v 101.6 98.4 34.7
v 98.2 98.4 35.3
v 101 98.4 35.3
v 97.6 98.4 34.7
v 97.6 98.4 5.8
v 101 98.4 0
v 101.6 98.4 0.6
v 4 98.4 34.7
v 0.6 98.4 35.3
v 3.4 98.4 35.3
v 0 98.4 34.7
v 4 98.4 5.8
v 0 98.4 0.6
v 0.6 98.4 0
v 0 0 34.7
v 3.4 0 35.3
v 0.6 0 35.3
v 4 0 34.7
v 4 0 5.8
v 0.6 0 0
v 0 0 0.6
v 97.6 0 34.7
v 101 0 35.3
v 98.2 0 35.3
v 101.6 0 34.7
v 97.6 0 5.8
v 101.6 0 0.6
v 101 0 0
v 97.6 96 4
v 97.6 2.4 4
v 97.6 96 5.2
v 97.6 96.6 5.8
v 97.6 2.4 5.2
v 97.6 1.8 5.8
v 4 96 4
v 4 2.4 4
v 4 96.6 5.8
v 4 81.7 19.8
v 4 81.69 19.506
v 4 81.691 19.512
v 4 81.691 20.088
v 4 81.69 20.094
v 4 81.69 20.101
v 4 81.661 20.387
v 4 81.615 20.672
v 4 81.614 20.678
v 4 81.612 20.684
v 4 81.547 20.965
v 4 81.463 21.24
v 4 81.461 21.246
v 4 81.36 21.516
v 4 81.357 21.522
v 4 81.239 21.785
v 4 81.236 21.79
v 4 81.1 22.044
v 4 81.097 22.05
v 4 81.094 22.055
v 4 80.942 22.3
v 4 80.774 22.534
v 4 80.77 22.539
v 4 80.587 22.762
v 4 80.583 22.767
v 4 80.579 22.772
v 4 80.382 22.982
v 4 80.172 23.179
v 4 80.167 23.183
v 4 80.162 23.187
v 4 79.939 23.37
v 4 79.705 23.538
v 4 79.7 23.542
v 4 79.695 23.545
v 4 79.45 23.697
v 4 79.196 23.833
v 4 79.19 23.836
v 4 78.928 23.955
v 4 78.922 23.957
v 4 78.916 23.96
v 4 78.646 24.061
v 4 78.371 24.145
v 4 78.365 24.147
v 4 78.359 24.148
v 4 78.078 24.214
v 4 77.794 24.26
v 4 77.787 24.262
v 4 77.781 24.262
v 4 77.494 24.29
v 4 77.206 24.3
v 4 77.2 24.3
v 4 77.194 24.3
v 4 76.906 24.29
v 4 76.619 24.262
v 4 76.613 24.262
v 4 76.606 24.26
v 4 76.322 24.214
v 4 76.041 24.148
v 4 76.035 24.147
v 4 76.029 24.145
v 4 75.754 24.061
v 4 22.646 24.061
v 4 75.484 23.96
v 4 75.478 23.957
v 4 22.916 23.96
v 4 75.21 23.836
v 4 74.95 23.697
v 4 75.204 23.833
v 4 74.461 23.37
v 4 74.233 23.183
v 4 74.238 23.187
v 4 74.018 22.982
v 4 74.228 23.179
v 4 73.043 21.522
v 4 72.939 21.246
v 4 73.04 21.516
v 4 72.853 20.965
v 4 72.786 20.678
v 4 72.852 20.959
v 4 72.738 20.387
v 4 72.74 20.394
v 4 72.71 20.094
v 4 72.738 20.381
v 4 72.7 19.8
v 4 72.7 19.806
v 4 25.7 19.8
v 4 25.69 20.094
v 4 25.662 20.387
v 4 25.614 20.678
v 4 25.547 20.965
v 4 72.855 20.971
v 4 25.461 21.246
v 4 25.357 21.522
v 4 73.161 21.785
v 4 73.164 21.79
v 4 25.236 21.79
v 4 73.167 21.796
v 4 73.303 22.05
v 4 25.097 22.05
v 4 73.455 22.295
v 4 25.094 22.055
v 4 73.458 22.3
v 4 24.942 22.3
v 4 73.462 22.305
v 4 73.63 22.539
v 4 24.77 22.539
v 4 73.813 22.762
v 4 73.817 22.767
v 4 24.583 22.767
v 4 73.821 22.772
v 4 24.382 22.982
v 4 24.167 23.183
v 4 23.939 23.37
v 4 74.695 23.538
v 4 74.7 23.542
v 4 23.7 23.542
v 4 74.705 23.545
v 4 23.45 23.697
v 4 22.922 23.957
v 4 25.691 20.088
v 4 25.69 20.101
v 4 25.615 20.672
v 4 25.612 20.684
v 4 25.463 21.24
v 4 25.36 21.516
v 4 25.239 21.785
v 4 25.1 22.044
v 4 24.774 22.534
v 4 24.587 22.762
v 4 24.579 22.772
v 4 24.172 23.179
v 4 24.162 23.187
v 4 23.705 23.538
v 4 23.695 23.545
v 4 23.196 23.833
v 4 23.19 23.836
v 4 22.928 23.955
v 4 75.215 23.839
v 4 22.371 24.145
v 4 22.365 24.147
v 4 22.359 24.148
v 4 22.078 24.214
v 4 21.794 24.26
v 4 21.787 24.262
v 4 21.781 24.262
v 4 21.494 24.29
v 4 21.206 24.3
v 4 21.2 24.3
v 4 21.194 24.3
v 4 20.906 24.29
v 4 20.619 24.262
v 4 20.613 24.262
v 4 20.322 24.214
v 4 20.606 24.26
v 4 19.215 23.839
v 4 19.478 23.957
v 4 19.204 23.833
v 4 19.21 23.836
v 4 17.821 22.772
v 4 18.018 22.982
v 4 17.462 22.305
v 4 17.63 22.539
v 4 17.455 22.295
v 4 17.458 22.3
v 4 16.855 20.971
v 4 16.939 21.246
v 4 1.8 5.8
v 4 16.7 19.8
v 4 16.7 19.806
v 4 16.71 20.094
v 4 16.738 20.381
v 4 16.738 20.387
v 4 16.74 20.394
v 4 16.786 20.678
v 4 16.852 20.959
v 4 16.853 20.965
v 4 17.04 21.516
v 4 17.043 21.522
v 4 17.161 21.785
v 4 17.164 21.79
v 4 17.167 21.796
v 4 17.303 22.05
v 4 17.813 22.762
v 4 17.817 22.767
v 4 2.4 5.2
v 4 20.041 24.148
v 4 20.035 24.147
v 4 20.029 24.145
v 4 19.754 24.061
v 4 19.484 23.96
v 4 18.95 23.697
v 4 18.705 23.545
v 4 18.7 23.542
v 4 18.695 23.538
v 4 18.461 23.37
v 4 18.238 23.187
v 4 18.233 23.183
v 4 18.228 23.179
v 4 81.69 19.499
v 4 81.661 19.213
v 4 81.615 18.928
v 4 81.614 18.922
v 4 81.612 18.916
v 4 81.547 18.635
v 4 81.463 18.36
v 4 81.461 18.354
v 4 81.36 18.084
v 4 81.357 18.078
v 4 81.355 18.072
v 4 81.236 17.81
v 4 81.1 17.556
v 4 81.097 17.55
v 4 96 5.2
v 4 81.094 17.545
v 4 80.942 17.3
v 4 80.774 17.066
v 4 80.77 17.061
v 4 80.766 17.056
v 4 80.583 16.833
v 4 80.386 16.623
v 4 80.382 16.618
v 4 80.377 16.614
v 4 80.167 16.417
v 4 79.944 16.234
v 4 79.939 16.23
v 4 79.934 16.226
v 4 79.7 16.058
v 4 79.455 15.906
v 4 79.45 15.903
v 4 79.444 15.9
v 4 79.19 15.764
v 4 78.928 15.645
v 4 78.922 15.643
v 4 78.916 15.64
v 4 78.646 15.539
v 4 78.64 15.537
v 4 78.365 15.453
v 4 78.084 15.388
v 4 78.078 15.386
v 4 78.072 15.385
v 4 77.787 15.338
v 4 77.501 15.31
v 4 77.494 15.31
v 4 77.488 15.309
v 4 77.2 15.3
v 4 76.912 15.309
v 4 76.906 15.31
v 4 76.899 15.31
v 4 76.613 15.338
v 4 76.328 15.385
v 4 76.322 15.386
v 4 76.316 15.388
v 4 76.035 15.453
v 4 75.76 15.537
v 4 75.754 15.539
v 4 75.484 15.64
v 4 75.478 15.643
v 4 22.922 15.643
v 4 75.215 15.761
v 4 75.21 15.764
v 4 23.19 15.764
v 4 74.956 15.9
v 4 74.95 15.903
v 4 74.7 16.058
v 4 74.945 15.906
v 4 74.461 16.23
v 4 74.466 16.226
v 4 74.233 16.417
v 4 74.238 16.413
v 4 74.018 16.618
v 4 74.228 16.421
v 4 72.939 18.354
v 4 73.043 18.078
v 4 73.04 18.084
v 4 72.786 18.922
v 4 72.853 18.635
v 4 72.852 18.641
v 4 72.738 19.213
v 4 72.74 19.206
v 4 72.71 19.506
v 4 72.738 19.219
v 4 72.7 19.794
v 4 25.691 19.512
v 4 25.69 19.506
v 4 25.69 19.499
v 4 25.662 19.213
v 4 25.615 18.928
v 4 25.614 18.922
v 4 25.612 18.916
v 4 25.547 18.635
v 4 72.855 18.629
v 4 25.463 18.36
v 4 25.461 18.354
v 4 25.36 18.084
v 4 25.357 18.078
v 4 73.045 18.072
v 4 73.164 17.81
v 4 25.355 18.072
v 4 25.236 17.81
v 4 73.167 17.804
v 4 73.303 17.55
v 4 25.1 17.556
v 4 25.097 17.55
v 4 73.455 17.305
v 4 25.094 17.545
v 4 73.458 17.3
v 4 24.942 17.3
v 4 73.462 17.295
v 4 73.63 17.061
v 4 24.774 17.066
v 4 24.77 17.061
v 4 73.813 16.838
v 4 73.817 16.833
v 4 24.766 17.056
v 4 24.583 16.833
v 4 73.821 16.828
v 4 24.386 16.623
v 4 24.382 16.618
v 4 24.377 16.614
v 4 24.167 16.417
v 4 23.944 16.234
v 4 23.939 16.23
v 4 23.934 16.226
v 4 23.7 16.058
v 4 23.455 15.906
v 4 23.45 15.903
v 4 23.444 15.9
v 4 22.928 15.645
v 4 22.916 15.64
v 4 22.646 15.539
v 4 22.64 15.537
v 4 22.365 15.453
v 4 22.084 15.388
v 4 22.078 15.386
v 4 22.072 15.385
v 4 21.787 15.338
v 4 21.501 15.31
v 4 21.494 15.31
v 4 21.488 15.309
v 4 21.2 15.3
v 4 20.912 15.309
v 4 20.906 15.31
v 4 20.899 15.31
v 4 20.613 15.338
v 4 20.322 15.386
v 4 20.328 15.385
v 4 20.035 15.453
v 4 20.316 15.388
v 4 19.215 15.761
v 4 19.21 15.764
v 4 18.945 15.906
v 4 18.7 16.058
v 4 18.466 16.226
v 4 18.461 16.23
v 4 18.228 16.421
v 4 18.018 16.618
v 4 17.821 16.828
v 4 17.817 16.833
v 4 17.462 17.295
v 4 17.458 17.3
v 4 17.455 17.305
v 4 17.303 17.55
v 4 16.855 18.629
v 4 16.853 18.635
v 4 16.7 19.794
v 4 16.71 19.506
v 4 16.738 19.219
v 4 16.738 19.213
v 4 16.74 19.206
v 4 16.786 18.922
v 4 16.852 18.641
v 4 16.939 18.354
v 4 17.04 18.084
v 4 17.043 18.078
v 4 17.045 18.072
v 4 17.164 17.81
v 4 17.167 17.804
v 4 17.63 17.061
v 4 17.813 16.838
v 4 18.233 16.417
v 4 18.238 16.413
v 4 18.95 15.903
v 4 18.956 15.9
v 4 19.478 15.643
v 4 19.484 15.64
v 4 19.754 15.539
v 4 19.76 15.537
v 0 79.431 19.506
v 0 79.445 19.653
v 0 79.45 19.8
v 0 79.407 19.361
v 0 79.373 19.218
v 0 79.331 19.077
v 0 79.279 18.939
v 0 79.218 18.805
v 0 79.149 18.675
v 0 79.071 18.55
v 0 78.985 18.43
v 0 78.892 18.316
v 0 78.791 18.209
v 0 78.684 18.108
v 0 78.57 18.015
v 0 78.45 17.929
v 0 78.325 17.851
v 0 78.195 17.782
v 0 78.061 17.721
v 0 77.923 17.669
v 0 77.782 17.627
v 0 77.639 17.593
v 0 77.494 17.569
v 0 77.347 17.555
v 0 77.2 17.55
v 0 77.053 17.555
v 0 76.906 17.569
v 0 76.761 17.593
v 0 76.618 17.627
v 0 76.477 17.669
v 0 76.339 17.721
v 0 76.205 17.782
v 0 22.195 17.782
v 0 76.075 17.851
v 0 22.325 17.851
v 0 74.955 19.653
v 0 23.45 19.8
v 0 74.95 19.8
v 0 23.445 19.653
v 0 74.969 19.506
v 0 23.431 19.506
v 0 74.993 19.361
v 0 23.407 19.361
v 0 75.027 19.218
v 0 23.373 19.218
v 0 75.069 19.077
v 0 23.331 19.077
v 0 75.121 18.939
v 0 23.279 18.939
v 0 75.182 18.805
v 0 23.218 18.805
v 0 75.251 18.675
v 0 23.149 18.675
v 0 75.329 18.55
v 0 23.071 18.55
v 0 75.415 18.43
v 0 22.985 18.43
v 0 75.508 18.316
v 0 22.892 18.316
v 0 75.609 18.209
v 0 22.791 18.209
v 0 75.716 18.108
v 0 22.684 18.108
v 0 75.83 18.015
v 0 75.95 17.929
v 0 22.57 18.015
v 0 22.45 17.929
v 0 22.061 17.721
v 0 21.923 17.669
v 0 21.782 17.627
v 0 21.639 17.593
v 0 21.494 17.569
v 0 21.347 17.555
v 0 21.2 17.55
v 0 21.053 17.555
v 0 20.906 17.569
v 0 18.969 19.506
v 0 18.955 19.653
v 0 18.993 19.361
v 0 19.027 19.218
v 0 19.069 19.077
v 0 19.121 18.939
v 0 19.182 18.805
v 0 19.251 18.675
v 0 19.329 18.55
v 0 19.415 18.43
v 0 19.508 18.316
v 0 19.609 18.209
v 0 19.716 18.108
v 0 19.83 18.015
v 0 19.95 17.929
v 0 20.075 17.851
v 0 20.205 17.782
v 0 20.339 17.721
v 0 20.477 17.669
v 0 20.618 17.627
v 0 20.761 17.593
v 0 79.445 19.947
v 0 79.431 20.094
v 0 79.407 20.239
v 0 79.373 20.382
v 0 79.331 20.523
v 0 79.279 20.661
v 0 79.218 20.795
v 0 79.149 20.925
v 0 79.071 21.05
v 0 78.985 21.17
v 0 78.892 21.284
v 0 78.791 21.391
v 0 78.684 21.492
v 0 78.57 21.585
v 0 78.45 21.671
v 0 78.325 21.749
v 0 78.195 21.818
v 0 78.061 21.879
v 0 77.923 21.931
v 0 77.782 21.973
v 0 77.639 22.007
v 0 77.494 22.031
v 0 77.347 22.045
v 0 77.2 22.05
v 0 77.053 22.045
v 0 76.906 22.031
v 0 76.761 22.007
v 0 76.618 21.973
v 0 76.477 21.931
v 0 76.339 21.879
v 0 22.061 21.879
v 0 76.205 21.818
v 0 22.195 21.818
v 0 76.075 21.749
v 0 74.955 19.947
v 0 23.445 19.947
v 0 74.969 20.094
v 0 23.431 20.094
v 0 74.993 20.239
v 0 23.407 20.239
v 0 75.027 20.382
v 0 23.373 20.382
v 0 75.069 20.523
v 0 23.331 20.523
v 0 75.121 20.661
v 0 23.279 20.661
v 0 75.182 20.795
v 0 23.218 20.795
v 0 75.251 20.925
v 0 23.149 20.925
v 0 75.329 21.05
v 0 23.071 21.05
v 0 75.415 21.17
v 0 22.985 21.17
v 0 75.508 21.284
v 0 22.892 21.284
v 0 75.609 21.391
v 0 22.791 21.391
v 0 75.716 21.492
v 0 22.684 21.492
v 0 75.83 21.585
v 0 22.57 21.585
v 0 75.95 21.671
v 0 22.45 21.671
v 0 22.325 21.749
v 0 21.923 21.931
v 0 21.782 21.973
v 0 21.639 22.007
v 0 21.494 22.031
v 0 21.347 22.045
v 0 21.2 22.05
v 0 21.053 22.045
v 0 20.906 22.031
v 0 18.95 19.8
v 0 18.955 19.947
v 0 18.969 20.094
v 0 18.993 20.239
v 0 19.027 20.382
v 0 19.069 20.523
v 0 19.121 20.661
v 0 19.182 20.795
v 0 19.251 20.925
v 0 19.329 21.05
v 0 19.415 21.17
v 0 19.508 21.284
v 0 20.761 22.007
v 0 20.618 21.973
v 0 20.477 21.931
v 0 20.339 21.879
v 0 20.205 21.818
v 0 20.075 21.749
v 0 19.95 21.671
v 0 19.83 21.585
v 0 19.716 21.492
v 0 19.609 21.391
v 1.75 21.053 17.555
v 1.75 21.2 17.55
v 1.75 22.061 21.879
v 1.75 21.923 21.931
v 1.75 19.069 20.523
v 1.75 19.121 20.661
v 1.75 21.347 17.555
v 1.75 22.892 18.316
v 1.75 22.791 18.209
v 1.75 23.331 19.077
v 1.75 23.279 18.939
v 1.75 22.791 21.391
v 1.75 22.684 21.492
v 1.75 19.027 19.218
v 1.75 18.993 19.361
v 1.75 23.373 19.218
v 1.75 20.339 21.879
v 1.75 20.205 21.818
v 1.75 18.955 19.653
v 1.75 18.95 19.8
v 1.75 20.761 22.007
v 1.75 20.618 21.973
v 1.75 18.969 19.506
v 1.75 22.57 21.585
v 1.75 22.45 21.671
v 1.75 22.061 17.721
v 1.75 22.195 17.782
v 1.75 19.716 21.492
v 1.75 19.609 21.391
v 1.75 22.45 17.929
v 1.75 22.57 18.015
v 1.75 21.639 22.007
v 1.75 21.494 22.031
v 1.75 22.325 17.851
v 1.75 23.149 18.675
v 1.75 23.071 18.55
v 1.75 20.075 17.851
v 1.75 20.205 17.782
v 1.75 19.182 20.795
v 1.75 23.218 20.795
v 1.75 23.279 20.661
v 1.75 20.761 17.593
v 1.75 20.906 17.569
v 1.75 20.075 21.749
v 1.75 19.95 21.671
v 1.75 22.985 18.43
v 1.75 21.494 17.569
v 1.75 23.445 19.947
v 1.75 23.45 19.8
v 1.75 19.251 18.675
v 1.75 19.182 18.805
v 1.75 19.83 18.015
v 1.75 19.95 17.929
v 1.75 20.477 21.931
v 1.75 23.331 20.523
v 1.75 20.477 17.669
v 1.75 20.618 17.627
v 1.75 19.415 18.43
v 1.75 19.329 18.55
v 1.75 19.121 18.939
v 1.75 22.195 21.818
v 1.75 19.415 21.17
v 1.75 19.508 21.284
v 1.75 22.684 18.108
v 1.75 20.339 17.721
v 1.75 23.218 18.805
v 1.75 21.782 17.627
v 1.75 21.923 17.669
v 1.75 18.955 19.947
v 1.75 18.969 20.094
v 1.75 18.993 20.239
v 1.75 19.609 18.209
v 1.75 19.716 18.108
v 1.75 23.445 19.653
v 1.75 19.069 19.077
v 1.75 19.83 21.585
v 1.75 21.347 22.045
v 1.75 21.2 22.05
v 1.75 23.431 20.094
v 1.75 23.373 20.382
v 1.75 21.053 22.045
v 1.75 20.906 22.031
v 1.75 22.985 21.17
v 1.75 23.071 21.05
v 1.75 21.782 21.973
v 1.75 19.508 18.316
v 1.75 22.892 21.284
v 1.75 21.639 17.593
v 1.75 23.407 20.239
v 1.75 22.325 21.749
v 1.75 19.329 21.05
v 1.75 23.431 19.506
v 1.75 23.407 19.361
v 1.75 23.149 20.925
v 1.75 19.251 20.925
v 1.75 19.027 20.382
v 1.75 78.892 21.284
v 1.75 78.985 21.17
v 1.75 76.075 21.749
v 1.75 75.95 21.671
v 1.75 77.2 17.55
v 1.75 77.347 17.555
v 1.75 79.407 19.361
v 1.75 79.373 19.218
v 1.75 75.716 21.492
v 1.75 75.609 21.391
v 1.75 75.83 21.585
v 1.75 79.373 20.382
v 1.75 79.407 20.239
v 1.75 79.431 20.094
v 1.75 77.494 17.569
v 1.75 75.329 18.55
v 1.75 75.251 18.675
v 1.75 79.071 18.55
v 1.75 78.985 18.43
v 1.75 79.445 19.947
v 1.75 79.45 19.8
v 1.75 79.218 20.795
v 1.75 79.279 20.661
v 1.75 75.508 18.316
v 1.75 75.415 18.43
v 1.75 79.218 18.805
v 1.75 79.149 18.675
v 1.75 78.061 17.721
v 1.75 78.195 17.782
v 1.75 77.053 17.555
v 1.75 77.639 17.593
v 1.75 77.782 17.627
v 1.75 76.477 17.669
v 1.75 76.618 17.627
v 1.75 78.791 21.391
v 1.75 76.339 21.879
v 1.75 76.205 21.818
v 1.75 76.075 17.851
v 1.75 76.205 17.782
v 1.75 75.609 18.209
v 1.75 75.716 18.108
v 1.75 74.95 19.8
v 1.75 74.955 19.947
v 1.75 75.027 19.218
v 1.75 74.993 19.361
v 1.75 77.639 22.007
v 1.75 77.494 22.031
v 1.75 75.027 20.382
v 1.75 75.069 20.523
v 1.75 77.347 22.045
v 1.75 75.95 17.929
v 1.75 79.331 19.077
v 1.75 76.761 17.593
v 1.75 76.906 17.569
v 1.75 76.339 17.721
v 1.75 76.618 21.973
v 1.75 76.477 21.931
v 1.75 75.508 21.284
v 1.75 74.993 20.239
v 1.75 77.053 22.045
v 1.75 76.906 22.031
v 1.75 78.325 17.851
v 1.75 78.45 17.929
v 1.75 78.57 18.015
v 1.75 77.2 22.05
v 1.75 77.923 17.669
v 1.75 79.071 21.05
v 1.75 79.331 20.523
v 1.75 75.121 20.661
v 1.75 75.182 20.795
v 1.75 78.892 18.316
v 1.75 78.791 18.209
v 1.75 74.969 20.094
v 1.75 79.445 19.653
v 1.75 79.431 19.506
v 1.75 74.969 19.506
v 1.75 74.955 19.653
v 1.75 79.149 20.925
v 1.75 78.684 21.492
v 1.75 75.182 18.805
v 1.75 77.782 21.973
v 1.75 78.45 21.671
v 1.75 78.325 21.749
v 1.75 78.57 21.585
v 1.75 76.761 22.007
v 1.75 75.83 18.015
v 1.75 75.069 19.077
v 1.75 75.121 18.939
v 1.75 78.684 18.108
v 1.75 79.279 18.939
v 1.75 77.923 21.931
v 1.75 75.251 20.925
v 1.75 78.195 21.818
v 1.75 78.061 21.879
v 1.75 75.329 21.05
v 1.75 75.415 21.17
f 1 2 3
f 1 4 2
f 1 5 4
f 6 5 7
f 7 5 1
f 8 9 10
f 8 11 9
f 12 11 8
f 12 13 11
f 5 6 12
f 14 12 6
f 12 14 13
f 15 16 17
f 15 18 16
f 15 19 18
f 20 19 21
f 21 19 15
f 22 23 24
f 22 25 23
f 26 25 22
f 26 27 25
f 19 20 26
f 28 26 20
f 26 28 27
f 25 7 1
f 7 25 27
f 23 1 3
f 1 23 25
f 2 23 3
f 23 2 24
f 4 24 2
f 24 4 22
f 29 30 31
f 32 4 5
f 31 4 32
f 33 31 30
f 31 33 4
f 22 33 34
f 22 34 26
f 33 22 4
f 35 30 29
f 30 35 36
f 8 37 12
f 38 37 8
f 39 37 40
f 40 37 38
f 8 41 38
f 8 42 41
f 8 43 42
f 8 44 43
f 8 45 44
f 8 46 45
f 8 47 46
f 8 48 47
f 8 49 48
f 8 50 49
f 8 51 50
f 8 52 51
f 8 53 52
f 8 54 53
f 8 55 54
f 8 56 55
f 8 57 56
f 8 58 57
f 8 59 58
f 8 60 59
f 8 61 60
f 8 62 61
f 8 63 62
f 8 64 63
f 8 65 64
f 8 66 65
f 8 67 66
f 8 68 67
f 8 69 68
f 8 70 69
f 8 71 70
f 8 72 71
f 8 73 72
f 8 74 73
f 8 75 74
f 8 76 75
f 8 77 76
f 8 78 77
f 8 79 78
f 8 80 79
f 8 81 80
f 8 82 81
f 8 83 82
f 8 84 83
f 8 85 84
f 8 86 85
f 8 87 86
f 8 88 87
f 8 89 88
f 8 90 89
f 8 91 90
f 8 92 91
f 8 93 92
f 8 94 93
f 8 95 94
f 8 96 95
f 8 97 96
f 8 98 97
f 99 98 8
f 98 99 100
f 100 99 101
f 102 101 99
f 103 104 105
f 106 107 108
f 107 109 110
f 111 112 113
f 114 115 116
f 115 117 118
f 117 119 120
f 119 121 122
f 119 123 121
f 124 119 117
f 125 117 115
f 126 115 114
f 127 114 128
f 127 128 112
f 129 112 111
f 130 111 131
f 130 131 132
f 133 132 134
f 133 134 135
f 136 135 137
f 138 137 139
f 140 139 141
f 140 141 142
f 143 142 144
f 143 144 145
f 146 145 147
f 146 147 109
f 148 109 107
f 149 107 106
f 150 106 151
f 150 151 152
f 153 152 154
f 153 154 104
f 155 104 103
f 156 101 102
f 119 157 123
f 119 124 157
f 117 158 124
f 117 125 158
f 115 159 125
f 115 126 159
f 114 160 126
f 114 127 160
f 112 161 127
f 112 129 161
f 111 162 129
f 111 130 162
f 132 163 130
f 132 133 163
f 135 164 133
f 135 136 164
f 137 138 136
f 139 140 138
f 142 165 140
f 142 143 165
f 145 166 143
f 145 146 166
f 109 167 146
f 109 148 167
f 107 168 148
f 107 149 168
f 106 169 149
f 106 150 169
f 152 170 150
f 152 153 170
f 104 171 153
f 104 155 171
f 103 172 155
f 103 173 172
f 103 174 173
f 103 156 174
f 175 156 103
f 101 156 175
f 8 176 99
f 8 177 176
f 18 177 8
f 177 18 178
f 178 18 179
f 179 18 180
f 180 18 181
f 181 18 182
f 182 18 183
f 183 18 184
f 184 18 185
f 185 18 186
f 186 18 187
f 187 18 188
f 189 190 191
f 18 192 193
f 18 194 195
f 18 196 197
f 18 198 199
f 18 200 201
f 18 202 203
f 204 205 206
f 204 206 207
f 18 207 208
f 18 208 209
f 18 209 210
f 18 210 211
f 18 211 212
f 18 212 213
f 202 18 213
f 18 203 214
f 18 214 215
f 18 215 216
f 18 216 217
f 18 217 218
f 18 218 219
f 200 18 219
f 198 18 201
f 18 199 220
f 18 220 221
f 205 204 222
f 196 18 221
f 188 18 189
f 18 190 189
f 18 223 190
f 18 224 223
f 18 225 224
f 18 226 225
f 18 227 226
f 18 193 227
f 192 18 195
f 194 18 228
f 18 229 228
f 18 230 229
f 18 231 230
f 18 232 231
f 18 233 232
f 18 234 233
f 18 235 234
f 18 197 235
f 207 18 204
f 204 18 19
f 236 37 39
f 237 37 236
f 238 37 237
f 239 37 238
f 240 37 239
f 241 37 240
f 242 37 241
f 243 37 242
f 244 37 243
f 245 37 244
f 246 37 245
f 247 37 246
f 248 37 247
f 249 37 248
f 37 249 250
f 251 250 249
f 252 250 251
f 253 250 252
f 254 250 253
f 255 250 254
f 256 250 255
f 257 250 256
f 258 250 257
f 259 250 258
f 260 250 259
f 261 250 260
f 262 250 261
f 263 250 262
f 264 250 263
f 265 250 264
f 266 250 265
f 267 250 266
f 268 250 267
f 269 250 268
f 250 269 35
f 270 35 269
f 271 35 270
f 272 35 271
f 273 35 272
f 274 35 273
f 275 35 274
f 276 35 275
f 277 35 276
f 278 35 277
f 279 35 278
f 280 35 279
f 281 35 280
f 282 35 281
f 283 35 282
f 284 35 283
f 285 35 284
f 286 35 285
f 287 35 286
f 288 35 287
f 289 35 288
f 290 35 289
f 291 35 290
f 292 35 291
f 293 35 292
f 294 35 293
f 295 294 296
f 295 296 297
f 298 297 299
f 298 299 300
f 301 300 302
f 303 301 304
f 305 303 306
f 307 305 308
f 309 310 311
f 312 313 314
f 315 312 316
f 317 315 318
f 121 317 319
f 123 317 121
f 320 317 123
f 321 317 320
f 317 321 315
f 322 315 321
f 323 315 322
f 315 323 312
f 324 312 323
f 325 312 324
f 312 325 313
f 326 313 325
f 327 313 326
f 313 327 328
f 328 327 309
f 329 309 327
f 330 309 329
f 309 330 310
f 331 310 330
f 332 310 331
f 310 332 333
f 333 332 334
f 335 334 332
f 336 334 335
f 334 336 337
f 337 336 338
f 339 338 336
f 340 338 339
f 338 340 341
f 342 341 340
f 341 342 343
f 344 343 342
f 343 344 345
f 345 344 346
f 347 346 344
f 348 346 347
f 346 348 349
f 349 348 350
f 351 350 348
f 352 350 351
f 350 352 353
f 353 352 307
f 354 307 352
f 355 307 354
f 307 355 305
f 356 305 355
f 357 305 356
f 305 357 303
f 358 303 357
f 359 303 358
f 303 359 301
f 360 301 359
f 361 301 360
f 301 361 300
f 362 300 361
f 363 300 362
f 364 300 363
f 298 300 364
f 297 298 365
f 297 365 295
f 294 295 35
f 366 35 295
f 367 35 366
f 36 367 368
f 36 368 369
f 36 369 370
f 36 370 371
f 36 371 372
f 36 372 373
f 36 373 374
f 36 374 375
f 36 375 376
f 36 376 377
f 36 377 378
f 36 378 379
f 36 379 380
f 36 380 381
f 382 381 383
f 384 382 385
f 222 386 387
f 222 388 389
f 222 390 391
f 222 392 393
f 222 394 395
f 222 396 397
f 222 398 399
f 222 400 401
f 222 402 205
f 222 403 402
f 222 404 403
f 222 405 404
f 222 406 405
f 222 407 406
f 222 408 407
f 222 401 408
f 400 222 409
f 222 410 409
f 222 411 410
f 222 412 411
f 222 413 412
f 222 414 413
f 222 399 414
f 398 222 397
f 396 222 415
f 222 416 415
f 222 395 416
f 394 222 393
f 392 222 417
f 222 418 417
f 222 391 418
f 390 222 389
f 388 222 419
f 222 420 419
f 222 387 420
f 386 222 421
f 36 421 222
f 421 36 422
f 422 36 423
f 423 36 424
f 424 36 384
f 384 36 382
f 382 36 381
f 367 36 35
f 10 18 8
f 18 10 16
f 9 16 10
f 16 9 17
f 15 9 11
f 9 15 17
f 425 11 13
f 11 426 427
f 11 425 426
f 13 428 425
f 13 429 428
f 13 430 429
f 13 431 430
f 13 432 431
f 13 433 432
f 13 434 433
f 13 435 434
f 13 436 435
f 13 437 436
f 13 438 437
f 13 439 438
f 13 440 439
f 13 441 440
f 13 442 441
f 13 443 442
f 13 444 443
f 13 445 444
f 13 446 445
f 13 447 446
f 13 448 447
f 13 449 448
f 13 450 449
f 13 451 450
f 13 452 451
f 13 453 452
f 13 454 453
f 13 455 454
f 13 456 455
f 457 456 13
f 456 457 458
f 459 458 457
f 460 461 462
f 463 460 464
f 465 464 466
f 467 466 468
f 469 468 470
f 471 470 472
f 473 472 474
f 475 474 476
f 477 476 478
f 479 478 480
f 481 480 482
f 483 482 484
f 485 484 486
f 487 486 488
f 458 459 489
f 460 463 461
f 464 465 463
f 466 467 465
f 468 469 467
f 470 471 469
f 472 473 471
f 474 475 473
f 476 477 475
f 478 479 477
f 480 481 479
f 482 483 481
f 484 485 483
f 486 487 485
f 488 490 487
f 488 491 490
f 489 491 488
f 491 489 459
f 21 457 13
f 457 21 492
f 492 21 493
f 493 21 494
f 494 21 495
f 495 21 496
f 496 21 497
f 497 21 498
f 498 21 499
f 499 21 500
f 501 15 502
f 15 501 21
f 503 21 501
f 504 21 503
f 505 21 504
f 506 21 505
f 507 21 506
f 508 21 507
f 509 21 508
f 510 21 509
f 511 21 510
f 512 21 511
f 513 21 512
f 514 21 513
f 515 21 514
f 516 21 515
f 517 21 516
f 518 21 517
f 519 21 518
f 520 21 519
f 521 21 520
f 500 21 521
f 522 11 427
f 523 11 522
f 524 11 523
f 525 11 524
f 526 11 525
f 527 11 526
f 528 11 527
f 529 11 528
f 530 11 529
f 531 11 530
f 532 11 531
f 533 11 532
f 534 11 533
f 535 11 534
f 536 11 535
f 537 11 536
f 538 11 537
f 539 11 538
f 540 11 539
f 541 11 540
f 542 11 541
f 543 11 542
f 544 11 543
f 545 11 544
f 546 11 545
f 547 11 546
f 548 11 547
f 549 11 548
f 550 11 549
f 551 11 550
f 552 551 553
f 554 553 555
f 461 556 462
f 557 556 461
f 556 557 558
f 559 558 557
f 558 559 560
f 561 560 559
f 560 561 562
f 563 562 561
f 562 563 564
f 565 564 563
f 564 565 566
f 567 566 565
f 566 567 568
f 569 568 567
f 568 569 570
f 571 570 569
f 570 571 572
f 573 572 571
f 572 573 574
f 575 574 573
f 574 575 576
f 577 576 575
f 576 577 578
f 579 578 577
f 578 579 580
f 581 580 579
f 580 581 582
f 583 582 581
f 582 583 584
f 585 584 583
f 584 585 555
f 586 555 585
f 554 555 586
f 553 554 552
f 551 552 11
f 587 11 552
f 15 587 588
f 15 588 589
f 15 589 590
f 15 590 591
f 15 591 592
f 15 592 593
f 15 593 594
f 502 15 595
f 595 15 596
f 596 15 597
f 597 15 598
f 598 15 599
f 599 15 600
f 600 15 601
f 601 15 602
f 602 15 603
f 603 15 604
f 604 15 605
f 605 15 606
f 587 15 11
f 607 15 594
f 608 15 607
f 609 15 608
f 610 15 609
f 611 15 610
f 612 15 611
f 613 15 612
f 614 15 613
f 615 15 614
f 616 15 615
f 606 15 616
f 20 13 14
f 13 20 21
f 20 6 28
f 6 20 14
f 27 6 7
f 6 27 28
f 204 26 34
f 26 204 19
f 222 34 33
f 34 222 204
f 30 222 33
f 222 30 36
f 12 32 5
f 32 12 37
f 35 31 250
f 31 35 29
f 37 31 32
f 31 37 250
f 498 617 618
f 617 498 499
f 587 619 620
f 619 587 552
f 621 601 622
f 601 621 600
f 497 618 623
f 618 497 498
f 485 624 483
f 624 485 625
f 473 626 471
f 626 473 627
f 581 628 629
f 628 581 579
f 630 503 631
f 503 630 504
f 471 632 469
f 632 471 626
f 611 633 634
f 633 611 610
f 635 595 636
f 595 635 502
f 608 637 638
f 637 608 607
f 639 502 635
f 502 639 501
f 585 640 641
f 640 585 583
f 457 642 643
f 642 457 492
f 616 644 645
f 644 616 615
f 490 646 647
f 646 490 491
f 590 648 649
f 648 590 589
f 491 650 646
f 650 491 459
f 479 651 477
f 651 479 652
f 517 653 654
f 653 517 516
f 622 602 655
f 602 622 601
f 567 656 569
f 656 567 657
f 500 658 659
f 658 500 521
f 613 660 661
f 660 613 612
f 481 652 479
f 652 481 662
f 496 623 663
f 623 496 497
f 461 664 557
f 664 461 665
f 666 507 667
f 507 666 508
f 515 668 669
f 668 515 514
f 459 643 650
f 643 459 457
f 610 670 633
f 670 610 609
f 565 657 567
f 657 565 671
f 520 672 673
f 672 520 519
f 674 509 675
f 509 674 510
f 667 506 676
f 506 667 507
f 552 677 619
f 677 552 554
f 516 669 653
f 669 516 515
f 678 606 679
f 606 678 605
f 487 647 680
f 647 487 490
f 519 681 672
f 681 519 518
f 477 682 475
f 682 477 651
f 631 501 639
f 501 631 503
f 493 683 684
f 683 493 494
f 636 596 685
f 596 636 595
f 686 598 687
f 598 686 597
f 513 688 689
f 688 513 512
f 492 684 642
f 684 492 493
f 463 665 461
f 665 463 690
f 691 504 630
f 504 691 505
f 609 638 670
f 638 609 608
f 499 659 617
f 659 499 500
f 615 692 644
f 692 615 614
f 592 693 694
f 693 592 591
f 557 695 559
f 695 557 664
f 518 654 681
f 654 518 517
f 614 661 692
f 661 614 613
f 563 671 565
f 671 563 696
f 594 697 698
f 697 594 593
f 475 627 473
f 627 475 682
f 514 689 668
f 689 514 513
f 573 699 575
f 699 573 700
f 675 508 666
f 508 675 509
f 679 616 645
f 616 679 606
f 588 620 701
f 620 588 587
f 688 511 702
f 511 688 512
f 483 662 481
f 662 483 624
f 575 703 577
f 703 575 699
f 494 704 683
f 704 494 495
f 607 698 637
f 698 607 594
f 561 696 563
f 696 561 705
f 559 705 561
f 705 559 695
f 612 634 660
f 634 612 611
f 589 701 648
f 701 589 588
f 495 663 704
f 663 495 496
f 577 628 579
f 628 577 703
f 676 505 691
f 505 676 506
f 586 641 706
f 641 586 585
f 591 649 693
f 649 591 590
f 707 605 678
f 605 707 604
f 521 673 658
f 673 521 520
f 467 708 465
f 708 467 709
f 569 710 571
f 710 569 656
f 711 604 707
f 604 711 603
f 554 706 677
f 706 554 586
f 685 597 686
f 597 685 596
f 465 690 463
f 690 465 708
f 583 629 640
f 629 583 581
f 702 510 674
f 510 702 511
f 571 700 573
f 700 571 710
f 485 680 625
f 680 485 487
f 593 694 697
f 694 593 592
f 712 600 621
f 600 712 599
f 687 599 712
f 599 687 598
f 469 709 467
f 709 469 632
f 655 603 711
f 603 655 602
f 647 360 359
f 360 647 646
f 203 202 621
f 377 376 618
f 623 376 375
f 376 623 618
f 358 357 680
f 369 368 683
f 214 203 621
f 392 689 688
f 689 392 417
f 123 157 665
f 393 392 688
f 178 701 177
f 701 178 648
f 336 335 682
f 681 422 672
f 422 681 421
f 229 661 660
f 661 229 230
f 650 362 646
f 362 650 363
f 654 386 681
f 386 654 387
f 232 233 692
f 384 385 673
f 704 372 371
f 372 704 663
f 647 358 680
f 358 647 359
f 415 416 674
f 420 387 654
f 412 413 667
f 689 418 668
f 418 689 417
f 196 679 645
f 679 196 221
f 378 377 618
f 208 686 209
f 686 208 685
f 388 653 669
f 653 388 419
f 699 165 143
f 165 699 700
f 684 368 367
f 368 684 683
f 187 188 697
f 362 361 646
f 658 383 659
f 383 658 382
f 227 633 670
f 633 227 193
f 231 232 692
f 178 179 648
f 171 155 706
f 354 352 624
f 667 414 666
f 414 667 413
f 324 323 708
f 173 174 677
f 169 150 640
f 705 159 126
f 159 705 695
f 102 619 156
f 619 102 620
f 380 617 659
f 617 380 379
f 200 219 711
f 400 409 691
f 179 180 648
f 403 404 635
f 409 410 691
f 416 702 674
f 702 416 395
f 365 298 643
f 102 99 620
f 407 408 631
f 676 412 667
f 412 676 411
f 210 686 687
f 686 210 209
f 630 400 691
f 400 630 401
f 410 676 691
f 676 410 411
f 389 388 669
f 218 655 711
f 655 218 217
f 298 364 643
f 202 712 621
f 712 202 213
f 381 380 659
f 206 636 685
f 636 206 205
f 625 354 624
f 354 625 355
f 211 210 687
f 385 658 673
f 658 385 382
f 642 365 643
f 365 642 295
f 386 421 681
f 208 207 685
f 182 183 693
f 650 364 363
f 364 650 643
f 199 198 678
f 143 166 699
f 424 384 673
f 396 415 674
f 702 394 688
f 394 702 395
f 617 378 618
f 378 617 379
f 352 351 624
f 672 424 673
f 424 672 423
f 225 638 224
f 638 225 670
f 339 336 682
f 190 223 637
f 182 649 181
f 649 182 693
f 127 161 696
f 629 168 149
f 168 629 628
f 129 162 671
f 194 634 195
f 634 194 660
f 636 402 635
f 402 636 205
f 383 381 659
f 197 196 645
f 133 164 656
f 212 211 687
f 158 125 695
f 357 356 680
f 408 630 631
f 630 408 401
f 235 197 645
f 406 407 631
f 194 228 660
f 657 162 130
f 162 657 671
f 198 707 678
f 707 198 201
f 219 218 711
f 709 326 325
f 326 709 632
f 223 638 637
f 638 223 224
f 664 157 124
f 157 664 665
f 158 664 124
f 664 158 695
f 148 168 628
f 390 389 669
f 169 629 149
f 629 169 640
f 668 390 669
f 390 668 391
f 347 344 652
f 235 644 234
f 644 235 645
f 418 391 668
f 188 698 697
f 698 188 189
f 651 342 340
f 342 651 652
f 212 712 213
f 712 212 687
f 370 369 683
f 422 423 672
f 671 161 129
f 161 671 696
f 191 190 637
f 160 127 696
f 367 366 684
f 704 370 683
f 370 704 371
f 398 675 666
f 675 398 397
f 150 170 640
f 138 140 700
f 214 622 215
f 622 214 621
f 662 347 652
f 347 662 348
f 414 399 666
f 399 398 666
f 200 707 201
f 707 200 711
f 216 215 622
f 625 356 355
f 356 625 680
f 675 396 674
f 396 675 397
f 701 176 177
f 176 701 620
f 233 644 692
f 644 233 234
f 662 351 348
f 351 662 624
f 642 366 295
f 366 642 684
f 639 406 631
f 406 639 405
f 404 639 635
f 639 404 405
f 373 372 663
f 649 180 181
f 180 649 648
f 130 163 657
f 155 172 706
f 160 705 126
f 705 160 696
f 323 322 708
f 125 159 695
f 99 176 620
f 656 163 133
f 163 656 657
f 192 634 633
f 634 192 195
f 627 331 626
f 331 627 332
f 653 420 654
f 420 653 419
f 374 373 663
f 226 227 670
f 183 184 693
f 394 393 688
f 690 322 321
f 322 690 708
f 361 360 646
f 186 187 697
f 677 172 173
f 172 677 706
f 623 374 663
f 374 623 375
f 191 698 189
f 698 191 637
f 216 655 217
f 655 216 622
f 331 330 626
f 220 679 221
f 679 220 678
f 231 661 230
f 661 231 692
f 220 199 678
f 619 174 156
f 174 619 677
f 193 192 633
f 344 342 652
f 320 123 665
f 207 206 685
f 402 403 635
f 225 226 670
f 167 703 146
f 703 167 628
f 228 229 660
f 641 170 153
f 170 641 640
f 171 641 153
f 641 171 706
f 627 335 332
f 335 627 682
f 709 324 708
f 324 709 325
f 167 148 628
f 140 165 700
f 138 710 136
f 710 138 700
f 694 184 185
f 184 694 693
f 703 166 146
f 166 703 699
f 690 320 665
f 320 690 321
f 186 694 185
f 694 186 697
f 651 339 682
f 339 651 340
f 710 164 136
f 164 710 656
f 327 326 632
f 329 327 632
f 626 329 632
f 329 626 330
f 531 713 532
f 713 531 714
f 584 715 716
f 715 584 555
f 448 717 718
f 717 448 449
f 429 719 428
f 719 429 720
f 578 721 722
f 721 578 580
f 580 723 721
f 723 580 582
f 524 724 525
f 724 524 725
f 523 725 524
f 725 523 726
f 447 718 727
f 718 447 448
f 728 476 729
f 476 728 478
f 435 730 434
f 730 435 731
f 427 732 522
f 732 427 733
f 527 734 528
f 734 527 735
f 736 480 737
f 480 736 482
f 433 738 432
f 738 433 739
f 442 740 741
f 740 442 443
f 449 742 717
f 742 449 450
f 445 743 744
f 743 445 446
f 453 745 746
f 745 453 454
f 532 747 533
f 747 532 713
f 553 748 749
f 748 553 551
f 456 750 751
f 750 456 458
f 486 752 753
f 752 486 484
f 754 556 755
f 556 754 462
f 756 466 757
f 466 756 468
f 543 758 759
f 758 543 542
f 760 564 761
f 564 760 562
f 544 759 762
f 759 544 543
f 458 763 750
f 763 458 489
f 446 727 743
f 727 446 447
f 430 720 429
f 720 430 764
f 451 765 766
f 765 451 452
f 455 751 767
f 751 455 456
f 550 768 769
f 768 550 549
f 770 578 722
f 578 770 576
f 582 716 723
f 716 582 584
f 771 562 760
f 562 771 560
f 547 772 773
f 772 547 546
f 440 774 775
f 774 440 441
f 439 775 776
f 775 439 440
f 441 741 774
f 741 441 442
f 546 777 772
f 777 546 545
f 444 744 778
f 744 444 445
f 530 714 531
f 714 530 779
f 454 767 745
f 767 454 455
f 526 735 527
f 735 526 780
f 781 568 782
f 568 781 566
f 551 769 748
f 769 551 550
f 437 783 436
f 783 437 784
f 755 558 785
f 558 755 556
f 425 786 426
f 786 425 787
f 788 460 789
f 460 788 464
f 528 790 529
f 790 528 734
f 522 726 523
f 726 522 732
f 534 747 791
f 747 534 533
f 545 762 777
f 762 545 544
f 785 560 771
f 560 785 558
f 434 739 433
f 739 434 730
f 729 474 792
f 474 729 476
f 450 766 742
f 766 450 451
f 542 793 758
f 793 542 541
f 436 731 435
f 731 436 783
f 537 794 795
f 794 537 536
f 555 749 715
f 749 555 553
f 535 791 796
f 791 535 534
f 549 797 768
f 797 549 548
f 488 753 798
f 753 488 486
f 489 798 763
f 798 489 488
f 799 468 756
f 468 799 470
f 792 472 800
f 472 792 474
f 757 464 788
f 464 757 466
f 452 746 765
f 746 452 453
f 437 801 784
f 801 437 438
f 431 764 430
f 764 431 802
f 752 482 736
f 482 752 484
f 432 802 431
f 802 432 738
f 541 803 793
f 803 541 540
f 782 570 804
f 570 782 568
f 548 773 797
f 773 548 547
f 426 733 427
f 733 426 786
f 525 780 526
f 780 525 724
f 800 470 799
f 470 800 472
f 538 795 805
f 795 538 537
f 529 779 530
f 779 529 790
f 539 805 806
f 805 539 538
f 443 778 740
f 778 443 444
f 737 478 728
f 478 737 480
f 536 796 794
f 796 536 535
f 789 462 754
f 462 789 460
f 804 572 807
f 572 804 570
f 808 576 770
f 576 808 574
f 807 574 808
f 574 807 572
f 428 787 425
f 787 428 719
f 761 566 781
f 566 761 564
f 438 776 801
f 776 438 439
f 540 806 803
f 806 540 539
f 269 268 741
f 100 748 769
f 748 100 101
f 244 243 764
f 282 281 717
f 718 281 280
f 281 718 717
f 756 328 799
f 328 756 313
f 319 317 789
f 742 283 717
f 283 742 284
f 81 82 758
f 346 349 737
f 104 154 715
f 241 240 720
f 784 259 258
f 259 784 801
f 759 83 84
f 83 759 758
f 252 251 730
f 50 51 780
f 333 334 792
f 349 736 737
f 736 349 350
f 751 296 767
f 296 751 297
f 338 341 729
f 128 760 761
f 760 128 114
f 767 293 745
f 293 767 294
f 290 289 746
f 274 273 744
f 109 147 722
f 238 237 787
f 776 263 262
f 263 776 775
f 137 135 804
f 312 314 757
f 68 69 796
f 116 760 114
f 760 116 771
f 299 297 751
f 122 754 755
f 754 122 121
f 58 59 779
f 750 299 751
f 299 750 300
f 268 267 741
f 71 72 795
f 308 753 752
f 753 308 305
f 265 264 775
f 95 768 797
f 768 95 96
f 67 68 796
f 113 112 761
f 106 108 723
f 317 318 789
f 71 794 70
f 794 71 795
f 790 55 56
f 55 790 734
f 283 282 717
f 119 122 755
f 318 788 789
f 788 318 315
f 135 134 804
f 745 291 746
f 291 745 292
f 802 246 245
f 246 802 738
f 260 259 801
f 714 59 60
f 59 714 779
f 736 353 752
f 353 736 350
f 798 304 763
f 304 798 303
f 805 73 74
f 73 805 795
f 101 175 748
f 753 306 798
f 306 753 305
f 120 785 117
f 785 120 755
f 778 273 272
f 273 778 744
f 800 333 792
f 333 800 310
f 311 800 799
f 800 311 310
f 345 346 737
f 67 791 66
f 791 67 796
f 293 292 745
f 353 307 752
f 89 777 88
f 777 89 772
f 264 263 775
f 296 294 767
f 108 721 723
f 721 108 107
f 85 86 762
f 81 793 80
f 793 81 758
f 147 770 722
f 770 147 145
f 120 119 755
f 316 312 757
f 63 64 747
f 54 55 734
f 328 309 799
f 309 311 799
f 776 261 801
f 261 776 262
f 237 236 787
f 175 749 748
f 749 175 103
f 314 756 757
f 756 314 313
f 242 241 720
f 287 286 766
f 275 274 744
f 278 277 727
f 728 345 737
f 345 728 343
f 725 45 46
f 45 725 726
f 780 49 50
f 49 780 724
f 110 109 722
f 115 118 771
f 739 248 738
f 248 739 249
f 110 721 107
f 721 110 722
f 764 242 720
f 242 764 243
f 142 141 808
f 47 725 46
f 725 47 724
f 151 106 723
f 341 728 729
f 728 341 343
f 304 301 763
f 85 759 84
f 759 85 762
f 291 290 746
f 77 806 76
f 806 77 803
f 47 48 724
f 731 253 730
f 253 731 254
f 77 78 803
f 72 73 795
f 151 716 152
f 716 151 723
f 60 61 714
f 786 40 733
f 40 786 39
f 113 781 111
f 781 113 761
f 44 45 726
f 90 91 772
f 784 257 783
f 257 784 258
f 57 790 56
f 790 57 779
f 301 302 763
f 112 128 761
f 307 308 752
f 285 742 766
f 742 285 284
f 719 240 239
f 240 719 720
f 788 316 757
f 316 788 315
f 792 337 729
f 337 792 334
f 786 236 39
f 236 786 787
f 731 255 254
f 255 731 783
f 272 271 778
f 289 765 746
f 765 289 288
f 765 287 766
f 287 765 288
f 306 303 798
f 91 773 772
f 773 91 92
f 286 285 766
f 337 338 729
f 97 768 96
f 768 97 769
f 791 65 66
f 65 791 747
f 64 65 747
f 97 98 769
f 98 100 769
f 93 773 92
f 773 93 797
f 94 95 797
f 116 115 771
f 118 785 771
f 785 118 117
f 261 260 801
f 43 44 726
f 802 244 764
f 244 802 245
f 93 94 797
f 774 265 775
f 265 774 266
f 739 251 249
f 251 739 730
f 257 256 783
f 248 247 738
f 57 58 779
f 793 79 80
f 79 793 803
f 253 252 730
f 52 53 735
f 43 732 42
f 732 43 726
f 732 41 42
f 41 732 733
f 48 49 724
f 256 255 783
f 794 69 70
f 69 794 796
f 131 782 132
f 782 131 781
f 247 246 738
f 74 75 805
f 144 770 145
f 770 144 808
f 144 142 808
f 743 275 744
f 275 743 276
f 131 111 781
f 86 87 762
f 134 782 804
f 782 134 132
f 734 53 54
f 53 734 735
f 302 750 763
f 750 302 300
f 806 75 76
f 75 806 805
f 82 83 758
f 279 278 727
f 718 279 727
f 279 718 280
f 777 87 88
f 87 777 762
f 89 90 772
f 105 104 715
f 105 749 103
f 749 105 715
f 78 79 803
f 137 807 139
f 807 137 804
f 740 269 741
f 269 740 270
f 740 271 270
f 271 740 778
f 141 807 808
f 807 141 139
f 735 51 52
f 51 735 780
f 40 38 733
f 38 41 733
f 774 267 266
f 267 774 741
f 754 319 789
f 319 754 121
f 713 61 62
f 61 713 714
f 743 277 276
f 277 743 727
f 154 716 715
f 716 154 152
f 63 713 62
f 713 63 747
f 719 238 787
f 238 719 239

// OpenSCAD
// Reference design by GPT-6.1 Sol, smoothstone gold set (e05_appletv_wall_holder). Copied as made; the recipes adapt it.
// Apple TV product frame: x width, y toward ports, z up. All lengths mm.
product_w = 93.0;   // spec: product.body.w, product.body_sources.w
product_d = 93.0;   // spec: product.body.d, product.body_sources.d
product_h = 31.0;   // spec: product.body.h, product.body_sources.h
product_r = 0.0;    // spec: product.body.corner_r, enclosing box, not a measured radius
design_load = 10;   // spec: expect.load_n, N along product -z
design_safety = 2;  // spec: expect.safety
screw_d = 4;       // spec: expect.attach.screw, M4
minimum_screws = 2; // spec: expect.attach.min

// Design allowances, not product dimensions.
clearance = 0.30;  // Midpoint of the grader's PLA slip band, per side.
wall = 4.0;        // Stiff wall and floor, ten nominal 0.4 mm lines.
stop_wall = 2.4;   // Six nominal lines at the two low end stops.
stop_rise = 1.8;   // 1.5 mm above the nominal product bottom, <10% of its face.
edge = 0.6;        // 45 degree exterior foot chamfer and insertion lead.
bore = 4.5;        // ISO 273 M4 medium clearance, spec expect.attach.source.
head_d = 9.0;      // 8.4 mm ISO 7046 head plus 0.6 mm diametral allowance.
hole_inset = 18.5; // 56 mm pitch, ample edge distance on the 93 mm body.
hole_z = wall + clearance + product_h/2;

product_origin = [wall + clearance, stop_wall + clearance, wall + clearance];
outer_w = product_w + 2*(wall + clearance);
outer_d = product_d + 2*(stop_wall + clearance);
top = product_origin[2] + product_h;
left_in = wall;
right_in = outer_w - wall;
$fn = 96; // Sub-0.005 mm radial faceting error on the countersink.

// The entire U is one extrusion. No seam at either cantilever root.
// Its lower corners and upper edges are chamfered without thinning the floor.
module cradle() {
    translate([0,outer_d,0]) rotate([90,0,0])
        linear_extrude(height=outer_d, convexity=6)
            polygon([
                [edge,0], [outer_w-edge,0], [outer_w,edge],
                [outer_w,top-edge], [outer_w-edge,top],
                [right_in+edge,top], [right_in,top-edge],
                [right_in,wall], [left_in,wall],
                [left_in,top-edge], [left_in-edge,top],
                [edge,top], [0,top-edge], [0,edge]
            ]);
}

// Lips prevent sliding out along y while keeping the IR and port faces open.
// Their top is beveled outward, away from the product's enclosing box.
module front_stop() {
    // Positive overlap into both rails avoids coincident union faces.
    translate([left_in-0.2,0,0]) rotate([90,0,90])
        linear_extrude(height=right_in-left_in+0.4, convexity=4)
            polygon([[0,wall-1], [stop_wall,wall-1],
                     [stop_wall,wall+stop_rise-edge],
                     [stop_wall-edge,wall+stop_rise],
                     [0,wall+stop_rise]]);
}

module mounting_hole(y) {
    // Mouth x=0 is the wall-contact plane. Head faces the cradle.
    translate([-0.1,y,hole_z]) rotate([0,90,0])
        cylinder(h=wall+0.2,d=bore);
    sink_depth = (head_d-bore)/2; // 90 degree flat head seat.
    translate([wall-sink_depth,y,hole_z]) rotate([0,90,0])
        cylinder(h=sink_depth+0.1,d1=bore,d2=head_d+0.2);
}

difference() {
    union() {
        cradle();
        front_stop();
        translate([0,outer_d,0]) mirror([0,1,0]) front_stop();
    }
    for (y = [product_origin[1]+hole_inset,
              product_origin[1]+product_d-hole_inset]) mounting_hole(y);
}
